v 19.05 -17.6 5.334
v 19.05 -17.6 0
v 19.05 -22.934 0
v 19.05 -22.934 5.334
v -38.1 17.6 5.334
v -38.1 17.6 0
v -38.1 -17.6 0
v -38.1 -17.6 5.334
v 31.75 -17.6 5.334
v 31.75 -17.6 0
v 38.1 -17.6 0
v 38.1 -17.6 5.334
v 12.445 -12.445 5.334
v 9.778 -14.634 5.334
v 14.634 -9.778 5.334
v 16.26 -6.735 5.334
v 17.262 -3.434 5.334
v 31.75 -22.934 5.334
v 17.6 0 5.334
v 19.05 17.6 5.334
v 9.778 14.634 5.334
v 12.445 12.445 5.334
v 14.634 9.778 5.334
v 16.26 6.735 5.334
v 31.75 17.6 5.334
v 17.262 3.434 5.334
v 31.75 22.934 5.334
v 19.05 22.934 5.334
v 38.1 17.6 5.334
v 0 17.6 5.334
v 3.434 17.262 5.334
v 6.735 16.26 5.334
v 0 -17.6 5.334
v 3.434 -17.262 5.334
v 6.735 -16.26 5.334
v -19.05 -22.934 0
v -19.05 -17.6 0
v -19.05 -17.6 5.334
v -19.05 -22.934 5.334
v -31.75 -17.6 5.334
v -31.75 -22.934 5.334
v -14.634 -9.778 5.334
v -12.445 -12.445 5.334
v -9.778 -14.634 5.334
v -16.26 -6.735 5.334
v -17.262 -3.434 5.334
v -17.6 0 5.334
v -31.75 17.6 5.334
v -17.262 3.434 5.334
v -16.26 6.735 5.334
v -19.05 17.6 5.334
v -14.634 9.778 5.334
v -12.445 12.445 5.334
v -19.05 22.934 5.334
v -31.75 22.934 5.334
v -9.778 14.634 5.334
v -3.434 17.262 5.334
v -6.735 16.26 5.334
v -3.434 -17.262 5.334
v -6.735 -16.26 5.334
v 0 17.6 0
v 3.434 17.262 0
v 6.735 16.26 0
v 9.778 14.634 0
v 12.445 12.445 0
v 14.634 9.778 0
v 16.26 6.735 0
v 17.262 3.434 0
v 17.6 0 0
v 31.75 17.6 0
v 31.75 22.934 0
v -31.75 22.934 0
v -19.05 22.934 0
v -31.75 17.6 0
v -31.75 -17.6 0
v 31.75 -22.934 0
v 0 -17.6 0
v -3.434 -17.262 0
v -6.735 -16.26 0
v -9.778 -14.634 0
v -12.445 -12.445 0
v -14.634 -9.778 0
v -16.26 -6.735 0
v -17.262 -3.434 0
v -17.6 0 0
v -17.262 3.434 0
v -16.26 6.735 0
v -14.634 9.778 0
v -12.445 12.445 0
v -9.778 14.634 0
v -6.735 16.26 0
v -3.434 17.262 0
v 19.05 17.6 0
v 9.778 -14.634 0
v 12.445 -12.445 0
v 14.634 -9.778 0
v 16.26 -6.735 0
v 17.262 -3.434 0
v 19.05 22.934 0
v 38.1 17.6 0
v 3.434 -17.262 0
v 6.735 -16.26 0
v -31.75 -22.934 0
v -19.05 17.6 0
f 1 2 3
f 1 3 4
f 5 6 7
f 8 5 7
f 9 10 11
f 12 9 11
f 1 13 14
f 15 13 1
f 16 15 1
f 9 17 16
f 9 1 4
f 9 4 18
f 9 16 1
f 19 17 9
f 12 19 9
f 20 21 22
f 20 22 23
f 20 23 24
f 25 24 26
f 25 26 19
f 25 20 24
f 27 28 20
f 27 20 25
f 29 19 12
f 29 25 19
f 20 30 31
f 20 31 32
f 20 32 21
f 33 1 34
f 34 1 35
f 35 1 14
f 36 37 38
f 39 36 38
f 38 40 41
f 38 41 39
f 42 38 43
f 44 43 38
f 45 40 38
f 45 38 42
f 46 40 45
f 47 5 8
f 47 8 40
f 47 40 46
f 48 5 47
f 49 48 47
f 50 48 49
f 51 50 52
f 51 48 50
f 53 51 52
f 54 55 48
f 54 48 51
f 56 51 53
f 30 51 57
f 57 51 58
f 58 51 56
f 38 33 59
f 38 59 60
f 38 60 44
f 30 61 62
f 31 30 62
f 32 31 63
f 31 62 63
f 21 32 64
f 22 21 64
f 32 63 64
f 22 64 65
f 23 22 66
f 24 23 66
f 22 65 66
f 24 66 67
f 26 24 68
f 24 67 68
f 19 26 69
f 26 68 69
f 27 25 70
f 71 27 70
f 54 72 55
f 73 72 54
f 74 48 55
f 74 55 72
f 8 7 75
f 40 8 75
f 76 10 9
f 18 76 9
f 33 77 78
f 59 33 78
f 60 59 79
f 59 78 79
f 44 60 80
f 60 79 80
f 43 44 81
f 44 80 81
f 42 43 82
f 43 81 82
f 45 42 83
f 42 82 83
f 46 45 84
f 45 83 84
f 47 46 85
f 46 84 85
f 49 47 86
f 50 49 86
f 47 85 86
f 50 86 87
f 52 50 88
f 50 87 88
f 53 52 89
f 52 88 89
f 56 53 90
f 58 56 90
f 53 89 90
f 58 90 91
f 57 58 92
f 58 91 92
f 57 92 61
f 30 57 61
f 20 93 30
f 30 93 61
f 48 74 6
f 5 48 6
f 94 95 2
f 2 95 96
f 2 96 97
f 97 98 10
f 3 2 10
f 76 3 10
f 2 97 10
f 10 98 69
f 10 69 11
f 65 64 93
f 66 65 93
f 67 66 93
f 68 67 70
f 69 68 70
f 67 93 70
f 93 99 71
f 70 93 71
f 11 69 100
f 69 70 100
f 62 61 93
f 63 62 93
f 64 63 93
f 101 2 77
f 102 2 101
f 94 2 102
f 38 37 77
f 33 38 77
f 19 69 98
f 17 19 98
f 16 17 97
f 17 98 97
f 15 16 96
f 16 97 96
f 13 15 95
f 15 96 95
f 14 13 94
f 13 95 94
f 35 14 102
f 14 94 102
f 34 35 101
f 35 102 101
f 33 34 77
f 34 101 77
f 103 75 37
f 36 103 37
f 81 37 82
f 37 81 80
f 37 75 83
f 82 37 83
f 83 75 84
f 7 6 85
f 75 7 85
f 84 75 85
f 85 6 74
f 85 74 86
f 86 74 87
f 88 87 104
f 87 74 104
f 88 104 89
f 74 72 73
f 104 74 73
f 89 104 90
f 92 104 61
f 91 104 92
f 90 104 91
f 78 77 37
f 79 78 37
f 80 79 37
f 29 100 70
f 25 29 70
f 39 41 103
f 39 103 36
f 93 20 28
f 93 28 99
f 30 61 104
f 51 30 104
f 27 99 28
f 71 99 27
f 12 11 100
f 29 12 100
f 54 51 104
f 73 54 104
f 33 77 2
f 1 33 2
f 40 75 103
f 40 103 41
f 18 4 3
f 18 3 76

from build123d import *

# Parameters (mm, degrees)
BOSS_EXTRUDE1_DEPTH   = 5.334
BOSS_EXTRUDE1_2_DEPTH = 5.334
SKETCH3_W             = 12.7
SKETCH3_H             = 5.334
BOSS_EXTRUDE2_DEPTH   = 5.334
SKETCH4_W             = 12.7
SKETCH4_H             = 5.334
BOSS_EXTRUDE3_DEPTH   = 5.334


with BuildPart() as part:
    # Sketch1 → Boss-Extrude1 (new body)
    with BuildSketch(Plane.XY):
        with BuildLine():
            Line((-3.2e-08, 17.6), (-38.1, 17.6))
            Line((-38.1, 17.6), (-38.1, -17.6))
            Line((-38.1, -17.6), (0, -17.6))
            ThreePointArc((0, -17.6), (-17.6, -1.6e-08), (-3.2e-08, 17.6))
        make_face()
    extrude(amount=BOSS_EXTRUDE1_DEPTH)



with BuildPart() as body_2:
    # Sketch1 → Boss-Extrude1 2 (new body)
    with BuildSketch(Plane.XY):
        with BuildLine():
            Line((38.1, 17.6), (-3.2e-08, 17.6))
            ThreePointArc((-3.2e-08, 17.6), (17.6, 1.6e-08), (0, -17.6))
            Line((0, -17.6), (38.1, -17.6))
            Line((38.1, -17.6), (38.1, 17.6))
        make_face()
    extrude(amount=BOSS_EXTRUDE1_2_DEPTH)


with BuildPart() as part_1:
    add(part.part)

    add(body_2.part)  # Boss-Extrude2 merges body 2
    # Sketch3 → Boss-Extrude2 (add)
    with BuildSketch(Plane(origin=(0, 17.6, 0), x_dir=(1, 0, 0), z_dir=(0, 1, 0))):
        with Locations((-25.4, -2.667)):
            Rectangle(SKETCH3_W, SKETCH3_H)
        with Locations((25.4, -2.667)):
            Rectangle(SKETCH3_W, SKETCH3_H)
    extrude(amount=BOSS_EXTRUDE2_DEPTH)

    # Sketch4 → Boss-Extrude3 (add)
    with BuildSketch(Plane.XZ.offset(17.6)):
        with Locations((-25.4, 2.667)):
            Rectangle(SKETCH4_W, SKETCH4_H)
        with Locations((25.4, 2.667)):
            Rectangle(SKETCH4_W, SKETCH4_H)
    extrude(amount=BOSS_EXTRUDE3_DEPTH)


solid = part_1.part
